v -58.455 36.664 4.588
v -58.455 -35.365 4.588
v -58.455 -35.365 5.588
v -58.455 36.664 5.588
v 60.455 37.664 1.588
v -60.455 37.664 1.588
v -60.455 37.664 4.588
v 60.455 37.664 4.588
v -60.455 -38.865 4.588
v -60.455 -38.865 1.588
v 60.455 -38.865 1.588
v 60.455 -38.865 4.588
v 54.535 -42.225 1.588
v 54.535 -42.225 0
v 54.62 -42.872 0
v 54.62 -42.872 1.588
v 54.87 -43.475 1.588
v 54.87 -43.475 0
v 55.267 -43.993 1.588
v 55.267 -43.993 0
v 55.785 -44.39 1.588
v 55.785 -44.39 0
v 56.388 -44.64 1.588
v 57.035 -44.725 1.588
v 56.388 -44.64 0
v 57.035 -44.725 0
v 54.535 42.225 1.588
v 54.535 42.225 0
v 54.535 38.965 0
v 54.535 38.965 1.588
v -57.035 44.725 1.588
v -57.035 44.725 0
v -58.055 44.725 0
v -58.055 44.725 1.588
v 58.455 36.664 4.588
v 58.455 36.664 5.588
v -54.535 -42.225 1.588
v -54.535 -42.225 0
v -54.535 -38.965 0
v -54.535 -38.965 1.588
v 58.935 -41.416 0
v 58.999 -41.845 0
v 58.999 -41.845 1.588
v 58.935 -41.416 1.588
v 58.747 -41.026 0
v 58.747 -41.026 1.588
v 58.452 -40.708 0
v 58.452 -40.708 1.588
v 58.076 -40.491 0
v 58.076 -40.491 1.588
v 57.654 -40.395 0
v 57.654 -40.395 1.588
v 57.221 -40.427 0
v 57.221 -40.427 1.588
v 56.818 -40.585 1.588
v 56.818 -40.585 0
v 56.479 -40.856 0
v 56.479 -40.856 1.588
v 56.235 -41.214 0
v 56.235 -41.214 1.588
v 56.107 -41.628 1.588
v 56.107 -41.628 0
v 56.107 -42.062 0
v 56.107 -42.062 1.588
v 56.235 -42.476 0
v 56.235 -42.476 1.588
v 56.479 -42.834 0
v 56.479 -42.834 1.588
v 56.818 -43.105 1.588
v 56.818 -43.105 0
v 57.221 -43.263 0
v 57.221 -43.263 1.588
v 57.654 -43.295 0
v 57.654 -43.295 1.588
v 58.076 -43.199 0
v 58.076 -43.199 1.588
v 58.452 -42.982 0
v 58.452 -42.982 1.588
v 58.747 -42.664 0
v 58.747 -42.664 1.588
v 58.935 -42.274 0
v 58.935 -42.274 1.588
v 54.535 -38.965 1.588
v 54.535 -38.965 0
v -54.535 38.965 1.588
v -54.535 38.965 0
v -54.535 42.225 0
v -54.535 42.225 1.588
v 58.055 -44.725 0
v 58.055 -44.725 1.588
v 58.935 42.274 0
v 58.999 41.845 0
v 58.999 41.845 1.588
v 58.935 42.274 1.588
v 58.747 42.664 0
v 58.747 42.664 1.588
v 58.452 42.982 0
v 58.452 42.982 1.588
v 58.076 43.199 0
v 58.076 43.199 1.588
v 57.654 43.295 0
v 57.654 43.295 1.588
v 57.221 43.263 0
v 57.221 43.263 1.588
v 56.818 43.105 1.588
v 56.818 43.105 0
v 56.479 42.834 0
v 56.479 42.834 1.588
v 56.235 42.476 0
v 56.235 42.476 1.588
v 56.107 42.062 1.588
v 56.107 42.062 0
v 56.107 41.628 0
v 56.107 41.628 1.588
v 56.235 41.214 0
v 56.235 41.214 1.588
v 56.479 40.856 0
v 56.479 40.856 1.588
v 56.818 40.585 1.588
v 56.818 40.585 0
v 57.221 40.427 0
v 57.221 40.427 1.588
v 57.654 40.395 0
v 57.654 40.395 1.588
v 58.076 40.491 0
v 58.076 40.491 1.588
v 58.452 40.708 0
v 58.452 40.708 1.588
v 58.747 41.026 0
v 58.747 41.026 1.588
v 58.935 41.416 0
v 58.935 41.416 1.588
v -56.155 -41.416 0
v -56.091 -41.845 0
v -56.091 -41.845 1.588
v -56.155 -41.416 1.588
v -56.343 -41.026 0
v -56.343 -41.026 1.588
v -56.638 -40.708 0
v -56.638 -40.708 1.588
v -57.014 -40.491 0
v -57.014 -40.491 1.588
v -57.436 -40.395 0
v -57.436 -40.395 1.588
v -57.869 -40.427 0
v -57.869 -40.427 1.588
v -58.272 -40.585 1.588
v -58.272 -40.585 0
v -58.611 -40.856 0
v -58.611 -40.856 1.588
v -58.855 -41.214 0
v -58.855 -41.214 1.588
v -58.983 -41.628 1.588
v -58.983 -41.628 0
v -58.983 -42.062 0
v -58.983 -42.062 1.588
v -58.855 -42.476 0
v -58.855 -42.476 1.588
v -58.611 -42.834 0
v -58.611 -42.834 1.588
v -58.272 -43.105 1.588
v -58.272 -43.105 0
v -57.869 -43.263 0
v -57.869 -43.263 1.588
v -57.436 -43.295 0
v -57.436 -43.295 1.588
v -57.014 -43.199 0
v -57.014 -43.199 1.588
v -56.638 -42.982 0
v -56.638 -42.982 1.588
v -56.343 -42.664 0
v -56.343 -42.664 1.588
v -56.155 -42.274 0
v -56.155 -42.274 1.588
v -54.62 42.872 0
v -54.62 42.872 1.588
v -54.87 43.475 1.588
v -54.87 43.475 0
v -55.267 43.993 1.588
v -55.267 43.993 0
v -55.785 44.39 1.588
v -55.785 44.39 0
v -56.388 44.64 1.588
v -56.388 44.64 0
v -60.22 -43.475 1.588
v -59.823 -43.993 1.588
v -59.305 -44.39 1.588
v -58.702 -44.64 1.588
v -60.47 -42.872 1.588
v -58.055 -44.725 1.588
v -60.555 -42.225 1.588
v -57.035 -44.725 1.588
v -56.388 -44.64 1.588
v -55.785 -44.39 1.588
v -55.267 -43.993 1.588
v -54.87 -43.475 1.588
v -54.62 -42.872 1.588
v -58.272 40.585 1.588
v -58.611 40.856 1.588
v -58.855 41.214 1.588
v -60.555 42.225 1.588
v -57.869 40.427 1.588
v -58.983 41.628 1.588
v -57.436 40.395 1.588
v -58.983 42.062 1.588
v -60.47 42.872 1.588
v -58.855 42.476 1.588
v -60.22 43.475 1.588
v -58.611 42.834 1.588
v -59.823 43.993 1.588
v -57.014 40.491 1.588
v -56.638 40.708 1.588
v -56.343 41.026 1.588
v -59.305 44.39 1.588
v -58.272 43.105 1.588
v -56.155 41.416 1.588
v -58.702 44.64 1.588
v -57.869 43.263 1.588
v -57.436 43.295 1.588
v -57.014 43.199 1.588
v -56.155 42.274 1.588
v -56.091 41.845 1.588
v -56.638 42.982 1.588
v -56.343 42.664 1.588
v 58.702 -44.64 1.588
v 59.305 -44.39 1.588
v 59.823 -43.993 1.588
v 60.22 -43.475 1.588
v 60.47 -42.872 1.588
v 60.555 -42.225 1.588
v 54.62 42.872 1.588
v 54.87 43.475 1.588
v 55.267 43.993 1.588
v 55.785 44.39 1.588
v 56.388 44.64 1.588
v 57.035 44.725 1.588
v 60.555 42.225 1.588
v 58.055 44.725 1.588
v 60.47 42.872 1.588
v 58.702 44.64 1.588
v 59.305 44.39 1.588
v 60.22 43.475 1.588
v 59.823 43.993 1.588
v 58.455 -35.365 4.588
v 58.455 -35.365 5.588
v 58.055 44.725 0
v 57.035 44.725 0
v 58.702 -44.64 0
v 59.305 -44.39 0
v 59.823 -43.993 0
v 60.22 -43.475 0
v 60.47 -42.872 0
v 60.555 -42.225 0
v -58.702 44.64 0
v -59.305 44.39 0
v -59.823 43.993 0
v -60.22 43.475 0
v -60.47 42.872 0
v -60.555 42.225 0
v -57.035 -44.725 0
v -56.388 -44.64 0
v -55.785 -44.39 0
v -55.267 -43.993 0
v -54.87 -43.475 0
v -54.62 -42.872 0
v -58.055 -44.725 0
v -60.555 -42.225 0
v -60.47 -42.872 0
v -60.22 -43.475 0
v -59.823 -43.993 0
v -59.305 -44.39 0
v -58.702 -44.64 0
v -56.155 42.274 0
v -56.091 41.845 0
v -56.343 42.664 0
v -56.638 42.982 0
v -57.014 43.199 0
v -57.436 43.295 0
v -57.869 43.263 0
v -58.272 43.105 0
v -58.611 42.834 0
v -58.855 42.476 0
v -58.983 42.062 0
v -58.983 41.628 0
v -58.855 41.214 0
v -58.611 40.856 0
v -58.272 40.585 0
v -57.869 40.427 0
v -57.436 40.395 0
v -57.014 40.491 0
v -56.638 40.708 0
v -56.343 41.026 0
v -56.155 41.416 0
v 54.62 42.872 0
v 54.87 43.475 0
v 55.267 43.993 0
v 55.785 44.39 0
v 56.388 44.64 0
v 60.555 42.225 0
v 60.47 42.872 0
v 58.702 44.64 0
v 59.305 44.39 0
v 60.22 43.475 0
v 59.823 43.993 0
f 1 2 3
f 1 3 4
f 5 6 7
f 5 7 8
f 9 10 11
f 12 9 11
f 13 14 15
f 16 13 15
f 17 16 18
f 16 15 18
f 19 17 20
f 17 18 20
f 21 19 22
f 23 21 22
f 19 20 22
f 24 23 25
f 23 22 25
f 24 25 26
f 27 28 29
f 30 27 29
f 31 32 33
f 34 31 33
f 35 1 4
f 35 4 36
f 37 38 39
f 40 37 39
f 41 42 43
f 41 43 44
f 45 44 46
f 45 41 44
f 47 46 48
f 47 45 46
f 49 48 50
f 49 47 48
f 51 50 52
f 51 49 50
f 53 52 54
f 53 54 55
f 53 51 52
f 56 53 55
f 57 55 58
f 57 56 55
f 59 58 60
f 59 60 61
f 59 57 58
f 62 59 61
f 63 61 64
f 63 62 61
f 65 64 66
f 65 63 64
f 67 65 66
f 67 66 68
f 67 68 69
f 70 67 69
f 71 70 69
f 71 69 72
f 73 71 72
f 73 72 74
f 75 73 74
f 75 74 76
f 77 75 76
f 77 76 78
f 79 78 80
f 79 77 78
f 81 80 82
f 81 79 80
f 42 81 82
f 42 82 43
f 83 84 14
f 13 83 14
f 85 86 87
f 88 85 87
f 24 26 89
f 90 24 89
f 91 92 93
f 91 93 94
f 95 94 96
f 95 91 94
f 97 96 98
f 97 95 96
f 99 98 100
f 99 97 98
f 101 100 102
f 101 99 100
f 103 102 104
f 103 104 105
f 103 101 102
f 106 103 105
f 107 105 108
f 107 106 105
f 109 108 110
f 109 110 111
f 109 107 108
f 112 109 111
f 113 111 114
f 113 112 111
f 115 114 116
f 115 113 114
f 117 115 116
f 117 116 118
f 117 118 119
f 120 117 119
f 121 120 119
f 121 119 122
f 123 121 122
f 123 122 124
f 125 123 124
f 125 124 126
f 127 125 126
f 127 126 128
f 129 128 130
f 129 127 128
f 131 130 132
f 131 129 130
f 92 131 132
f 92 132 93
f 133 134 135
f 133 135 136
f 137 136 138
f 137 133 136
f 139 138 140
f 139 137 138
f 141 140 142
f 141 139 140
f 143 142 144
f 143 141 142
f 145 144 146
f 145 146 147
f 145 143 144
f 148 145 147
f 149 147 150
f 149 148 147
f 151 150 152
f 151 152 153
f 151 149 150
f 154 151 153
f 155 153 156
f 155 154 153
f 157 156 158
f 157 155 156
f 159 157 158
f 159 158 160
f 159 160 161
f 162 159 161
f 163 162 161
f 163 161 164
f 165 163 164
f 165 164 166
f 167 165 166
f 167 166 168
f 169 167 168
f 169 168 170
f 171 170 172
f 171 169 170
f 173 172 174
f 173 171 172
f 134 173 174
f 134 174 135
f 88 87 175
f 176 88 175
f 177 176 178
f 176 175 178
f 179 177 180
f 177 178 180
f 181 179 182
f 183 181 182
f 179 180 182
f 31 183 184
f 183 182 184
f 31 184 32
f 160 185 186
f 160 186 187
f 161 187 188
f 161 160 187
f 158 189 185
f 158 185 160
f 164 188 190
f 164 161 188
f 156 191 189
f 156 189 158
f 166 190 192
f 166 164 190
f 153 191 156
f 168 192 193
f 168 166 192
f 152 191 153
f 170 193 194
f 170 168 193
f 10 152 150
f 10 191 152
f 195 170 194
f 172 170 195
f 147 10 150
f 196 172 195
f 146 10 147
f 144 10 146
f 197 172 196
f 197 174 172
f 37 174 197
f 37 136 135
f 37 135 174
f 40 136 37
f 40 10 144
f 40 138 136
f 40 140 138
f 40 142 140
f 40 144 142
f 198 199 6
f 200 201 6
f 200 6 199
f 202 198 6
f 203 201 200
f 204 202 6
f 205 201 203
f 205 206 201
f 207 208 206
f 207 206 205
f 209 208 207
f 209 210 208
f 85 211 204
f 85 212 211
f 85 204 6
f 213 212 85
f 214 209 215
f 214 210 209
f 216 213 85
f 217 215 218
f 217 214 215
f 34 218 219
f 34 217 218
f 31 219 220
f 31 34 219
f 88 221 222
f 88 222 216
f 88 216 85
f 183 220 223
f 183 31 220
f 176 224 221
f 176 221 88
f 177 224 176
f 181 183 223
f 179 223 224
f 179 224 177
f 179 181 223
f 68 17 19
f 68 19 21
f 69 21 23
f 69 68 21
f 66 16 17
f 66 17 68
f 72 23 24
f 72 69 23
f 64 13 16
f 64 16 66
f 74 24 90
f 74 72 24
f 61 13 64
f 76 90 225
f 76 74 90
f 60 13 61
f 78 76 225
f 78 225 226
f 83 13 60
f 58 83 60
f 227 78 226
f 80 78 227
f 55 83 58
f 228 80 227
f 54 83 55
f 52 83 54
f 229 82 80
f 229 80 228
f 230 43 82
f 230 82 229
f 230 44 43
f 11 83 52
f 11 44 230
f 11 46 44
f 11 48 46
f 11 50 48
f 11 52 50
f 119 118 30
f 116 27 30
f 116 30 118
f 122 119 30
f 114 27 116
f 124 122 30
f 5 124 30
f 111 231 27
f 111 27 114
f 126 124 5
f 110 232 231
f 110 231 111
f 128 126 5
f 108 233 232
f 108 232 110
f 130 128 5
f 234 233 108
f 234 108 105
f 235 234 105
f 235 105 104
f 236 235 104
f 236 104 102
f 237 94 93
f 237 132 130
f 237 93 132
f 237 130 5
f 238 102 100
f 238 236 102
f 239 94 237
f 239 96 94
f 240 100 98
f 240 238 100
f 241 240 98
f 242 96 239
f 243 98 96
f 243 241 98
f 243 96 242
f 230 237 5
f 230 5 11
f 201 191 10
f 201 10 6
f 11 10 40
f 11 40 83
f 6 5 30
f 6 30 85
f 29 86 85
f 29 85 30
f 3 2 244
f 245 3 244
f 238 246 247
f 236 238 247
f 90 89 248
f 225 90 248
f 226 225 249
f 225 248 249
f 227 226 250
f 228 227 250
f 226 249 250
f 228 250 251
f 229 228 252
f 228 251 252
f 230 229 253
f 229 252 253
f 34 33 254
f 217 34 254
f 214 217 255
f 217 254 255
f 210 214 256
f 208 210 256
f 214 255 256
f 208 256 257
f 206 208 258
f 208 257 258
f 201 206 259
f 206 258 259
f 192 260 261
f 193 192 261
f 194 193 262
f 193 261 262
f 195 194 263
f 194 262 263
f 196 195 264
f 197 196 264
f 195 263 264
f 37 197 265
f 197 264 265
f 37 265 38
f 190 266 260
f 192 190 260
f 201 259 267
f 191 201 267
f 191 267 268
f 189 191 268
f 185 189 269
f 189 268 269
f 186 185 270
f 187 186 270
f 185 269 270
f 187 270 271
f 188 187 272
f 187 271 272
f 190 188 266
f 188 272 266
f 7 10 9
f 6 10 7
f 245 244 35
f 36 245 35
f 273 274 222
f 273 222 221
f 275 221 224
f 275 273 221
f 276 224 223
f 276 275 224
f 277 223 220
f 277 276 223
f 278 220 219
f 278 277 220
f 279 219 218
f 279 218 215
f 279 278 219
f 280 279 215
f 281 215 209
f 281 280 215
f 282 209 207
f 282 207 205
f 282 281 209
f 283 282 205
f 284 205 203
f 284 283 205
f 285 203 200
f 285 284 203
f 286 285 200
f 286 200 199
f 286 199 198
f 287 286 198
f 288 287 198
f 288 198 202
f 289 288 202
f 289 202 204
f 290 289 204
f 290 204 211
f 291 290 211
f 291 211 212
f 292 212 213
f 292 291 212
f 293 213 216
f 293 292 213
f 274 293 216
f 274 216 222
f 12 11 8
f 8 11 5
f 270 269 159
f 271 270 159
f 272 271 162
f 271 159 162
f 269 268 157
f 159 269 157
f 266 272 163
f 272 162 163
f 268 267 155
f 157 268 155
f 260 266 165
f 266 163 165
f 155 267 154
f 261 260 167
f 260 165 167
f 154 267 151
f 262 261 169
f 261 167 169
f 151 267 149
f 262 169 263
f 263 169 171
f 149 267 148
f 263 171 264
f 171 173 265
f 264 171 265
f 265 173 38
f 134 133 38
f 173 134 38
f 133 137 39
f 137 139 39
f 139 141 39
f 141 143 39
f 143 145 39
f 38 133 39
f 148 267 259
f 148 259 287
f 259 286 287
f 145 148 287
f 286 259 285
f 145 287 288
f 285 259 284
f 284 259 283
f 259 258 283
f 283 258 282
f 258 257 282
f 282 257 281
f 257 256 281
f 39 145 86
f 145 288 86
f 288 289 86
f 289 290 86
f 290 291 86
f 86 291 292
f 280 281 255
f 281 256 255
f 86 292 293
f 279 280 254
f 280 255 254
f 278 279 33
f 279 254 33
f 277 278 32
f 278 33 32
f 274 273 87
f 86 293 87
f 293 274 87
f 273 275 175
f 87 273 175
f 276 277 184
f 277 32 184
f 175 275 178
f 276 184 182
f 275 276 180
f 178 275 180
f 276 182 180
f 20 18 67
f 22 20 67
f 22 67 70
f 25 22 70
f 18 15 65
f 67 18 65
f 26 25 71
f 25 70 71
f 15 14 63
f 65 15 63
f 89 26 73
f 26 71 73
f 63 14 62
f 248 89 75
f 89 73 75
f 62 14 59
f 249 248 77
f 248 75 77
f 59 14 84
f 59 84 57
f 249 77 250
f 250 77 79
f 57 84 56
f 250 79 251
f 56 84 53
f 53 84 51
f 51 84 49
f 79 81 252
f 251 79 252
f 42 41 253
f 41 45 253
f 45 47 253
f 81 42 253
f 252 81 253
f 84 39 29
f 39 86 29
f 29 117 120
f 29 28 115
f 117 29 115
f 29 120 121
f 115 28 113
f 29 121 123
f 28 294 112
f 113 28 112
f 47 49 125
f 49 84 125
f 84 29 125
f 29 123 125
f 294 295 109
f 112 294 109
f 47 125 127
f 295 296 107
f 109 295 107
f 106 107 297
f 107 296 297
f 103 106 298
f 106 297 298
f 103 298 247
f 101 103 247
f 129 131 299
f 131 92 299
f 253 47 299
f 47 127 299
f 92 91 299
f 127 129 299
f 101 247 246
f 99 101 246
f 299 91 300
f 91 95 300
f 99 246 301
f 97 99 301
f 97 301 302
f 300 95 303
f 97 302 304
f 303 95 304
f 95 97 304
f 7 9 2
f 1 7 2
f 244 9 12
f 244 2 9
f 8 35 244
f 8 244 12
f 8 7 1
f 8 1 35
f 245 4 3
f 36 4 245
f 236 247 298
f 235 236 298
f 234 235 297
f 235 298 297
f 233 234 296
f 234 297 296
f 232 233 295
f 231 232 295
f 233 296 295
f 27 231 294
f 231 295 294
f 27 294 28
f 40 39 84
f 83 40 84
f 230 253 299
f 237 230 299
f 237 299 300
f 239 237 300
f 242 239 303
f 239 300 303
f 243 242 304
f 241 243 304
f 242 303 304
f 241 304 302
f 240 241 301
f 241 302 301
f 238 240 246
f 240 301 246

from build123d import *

# Parameters (mm, degrees)
SKETCH1_W           = 121.11
SKETCH1_H           = 77.93
SKETCH1_R           = 1.454399876
BOSS_EXTRUDE1_DEPTH = 1.5875
SKETCH2_W           = 120.91
SKETCH2_H           = 76.529195788
BOSS_EXTRUDE2_DEPTH = 3
SKETCH3_W           = 116.91
SKETCH3_H           = 72.029195788
BOSS_EXTRUDE3_DEPTH = 1


with BuildPart() as part:
    # Sketch1 → Boss-Extrude1 (new body)
    # profile 1 of 5: a face of its own
    with BuildSketch(Plane.XY):
        Rectangle(SKETCH1_W, SKETCH1_H)
    # profile 2 of 5: a face of its own
    with BuildSketch(Plane.XY):
        with BuildLine():
            Line((54.535, 42.225), (54.535, 38.965))
            Line((54.535, 38.965), (60.555, 38.965))
            Line((60.555, 38.965), (60.555, 42.225))
            ThreePointArc((60.555, 42.225), (59.822766953, 43.992766953), (58.055, 44.725))
            Line((58.055, 44.725), (57.035, 44.725))
            ThreePointArc((57.035, 44.725), (55.267233047, 43.992766953), (54.535, 42.225))
        make_face()
        with Locations((57.545, 41.845)):
            Circle(SKETCH1_R, mode=Mode.SUBTRACT)
    # profile 3 of 5: a face of its own
    with BuildSketch(Plane.XY):
        with BuildLine():
            Line((60.555, -38.965), (54.535, -38.965))
            Line((54.535, -38.965), (54.535, -42.225))
            ThreePointArc((54.535, -42.225), (55.267233047, -43.992766953), (57.035, -44.725))
            Line((57.035, -44.725), (58.055, -44.725))
            ThreePointArc((58.055, -44.725), (59.822766953, -43.992766953), (60.555, -42.225))
            Line((60.555, -42.225), (60.555, -38.965))
        make_face()
        with Locations((57.545, -41.845)):
            Circle(SKETCH1_R, mode=Mode.SUBTRACT)
    # profile 4 of 5: a face of its own
    with BuildSketch(Plane.XY):
        with BuildLine():
            Line((-60.555, 42.225), (-60.555, 38.965))
            Line((-60.555, 38.965), (-54.535, 38.965))
            Line((-54.535, 38.965), (-54.535, 42.225))
            ThreePointArc((-54.535, 42.225), (-55.267233047, 43.992766953), (-57.035, 44.725))
            Line((-57.035, 44.725), (-58.055, 44.725))
            ThreePointArc((-58.055, 44.725), (-59.822766953, 43.992766953), (-60.555, 42.225))
        make_face()
        with Locations((-57.545, 41.845)):
            Circle(SKETCH1_R, mode=Mode.SUBTRACT)
    # profile 5 of 5: a face of its own
    with BuildSketch(Plane.XY):
        with BuildLine():
            Line((-54.535, -38.965), (-60.555, -38.965))
            Line((-60.555, -38.965), (-60.555, -42.225))
            ThreePointArc((-60.555, -42.225), (-59.822766953, -43.992766953), (-58.055, -44.725))
            Line((-58.055, -44.725), (-57.035, -44.725))
            ThreePointArc((-57.035, -44.725), (-55.267233047, -43.992766953), (-54.535, -42.225))
            Line((-54.535, -42.225), (-54.535, -38.965))
        make_face()
        with Locations((-57.545, -41.845)):
            Circle(SKETCH1_R, mode=Mode.SUBTRACT)
    extrude(amount=BOSS_EXTRUDE1_DEPTH)

    # Sketch2 → Boss-Extrude2 (add)
    with BuildSketch(Plane.XY.offset(1.5875)):
        with Locations((0, -0.600402106)):
            Rectangle(SKETCH2_W, SKETCH2_H)
    extrude(amount=BOSS_EXTRUDE2_DEPTH)

    # Sketch3 → Boss-Extrude3 (add)
    with BuildSketch(Plane.XY.offset(4.5875)):
        with Locations((0, 0.649597894)):
            Rectangle(SKETCH3_W, SKETCH3_H)
    extrude(amount=BOSS_EXTRUDE3_DEPTH)


solid = part.part
